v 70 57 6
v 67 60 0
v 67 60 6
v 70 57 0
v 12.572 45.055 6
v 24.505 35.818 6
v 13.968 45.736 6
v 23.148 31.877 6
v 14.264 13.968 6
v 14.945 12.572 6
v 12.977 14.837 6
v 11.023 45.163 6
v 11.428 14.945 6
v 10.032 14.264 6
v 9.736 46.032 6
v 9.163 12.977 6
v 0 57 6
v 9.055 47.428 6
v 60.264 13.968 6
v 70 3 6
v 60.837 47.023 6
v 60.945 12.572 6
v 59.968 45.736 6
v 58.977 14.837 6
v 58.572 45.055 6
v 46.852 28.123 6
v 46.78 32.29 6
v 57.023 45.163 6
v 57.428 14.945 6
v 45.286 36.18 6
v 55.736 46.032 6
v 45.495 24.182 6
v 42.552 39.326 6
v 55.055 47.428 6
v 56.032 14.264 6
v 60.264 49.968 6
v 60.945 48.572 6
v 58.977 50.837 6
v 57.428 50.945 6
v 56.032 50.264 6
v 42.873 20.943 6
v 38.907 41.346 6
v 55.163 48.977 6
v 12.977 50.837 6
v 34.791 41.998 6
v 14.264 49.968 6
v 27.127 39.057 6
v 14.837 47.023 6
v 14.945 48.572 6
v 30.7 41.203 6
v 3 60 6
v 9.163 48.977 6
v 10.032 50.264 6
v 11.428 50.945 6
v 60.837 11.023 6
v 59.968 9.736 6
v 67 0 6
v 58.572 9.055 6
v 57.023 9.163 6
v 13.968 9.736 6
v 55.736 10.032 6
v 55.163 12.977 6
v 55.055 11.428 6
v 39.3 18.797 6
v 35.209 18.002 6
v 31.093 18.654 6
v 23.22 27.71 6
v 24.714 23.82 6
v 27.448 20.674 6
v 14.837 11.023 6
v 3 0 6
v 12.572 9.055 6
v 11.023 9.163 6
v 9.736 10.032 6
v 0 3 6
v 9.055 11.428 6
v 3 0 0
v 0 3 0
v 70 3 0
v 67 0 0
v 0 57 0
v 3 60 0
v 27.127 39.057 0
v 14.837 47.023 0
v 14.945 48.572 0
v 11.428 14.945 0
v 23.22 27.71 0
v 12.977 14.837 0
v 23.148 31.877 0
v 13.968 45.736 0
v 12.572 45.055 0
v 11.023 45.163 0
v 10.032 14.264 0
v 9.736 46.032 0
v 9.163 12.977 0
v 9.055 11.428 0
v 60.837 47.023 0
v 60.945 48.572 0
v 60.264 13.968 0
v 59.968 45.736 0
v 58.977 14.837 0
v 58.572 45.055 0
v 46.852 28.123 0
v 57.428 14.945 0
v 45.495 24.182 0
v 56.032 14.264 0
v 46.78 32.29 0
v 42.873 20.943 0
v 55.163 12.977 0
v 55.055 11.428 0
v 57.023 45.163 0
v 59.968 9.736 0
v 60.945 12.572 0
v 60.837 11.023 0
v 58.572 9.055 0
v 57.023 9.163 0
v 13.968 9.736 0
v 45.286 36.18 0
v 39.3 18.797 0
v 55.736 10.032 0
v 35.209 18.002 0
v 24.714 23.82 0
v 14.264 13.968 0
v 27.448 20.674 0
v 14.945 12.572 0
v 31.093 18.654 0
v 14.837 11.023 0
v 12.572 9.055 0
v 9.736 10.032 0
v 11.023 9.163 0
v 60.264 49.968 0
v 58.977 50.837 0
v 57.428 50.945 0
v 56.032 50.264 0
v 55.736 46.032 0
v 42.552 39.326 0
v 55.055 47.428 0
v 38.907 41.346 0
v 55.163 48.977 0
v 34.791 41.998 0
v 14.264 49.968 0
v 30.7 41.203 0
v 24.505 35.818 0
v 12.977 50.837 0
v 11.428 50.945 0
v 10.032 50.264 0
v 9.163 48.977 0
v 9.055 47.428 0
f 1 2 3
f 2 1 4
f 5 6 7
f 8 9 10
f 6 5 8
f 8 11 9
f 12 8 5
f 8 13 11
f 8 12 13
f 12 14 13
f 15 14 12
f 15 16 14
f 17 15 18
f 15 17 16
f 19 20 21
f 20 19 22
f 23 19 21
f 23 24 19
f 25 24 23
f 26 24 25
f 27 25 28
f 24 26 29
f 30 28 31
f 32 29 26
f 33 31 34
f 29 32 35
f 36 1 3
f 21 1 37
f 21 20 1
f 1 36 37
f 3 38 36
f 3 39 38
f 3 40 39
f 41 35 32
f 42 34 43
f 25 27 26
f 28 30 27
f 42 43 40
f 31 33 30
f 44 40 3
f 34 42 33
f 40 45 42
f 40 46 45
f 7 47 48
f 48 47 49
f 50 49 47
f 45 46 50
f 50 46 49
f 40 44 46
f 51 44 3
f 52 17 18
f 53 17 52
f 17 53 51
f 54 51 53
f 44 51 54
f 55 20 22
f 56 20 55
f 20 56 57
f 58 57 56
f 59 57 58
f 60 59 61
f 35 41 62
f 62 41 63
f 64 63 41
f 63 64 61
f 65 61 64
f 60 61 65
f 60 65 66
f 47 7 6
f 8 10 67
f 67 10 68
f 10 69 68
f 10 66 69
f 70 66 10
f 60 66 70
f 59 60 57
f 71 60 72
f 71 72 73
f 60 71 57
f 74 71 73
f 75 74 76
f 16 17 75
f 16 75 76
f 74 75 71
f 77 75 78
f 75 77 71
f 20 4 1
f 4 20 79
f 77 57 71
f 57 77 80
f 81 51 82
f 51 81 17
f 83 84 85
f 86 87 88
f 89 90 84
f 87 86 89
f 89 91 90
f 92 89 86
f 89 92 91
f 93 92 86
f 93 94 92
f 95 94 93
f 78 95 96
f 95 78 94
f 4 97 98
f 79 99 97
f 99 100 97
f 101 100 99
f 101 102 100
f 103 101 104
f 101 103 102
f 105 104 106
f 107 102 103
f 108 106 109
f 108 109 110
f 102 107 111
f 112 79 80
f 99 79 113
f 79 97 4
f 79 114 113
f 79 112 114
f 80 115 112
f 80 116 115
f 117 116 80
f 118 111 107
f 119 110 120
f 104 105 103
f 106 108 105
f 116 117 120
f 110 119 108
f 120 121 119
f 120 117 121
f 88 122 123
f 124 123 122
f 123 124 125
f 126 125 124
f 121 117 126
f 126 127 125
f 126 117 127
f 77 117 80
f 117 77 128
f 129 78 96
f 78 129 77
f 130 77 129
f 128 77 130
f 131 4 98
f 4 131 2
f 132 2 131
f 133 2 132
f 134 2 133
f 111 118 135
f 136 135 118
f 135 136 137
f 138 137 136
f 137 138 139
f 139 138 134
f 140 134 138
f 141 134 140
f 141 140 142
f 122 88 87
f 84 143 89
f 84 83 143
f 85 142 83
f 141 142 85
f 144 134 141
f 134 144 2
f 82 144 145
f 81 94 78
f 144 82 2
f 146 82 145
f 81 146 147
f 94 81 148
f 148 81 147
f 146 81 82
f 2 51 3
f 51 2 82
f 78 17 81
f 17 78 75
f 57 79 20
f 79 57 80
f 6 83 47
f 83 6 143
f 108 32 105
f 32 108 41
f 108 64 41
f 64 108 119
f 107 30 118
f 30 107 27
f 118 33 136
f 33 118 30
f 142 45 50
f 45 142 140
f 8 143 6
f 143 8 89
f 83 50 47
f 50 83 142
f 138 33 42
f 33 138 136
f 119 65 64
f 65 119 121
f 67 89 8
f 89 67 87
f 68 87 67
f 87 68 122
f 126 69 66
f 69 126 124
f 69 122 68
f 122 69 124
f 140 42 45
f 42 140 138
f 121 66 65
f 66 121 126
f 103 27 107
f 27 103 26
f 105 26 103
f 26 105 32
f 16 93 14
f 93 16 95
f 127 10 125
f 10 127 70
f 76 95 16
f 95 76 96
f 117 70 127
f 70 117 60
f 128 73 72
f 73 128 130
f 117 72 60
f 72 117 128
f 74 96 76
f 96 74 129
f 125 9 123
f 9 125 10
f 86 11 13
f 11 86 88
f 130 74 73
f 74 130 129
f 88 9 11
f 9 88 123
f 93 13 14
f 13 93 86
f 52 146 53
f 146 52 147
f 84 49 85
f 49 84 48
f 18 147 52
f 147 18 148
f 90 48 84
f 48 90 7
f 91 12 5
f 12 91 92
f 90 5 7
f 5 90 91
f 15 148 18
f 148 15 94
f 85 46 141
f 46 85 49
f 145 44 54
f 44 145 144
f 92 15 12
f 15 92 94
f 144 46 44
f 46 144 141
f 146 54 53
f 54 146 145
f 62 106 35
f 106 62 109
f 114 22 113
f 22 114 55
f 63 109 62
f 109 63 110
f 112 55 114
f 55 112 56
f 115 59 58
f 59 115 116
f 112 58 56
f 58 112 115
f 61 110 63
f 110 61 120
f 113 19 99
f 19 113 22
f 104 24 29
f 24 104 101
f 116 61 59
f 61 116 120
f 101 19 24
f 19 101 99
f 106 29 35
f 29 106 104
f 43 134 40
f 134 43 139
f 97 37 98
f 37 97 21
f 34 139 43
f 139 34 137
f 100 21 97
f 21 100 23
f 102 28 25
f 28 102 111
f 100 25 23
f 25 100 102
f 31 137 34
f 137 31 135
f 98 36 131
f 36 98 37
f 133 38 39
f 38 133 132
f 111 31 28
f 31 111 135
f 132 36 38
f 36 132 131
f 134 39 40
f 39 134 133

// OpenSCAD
$fn = 32;

// ----------------------------------------------------------------------
// Spacer plate: rect 70 x 60
// ----------------------------------------------------------------------

// --- parameters (mm) ---
bore_r = 12;              // centre bore radius
bolt_r = 3;               // bolt hole radius
plate_t = 6;              // plate thickness, Z (extrusion height)
plate_l = 70;             // plate length, X
plate_w = 60;             // plate width, Y
inset = 12;               // corner hole inset

profile = [[3, 0], [67, 0], [70, 3], [70, 57], [67, 60], [3, 60], [0, 57], [0, 3]];  // primary outline, 8 points, counter clockwise
void_1 = [[46.78, 32.29], [45.286, 36.18], [42.552, 39.326], [38.907, 41.346], [34.791, 41.998], [30.7, 41.203], [27.127, 39.057], [24.505, 35.818], [23.148, 31.877], [23.22, 27.71], [24.714, 23.82], [27.448, 20.674], [31.093, 18.654], [35.209, 18.002], [39.3, 18.797], [42.873, 20.943], [45.495, 24.182], [46.852, 28.123]];  // centre bore, 18 points
void_2 = [[14.945, 12.572], [14.264, 13.968], [12.977, 14.837], [11.428, 14.945], [10.032, 14.264], [9.163, 12.977], [9.055, 11.428], [9.736, 10.032], [11.023, 9.163], [12.572, 9.055], [13.968, 9.736], [14.837, 11.023]];  // corner hole, 12 points
void_3 = [[14.945, 48.572], [14.264, 49.968], [12.977, 50.837], [11.428, 50.945], [10.032, 50.264], [9.163, 48.977], [9.055, 47.428], [9.736, 46.032], [11.023, 45.163], [12.572, 45.055], [13.968, 45.736], [14.837, 47.023]];  // corner hole, 12 points
void_4 = [[60.945, 12.572], [60.264, 13.968], [58.977, 14.837], [57.428, 14.945], [56.032, 14.264], [55.163, 12.977], [55.055, 11.428], [55.736, 10.032], [57.023, 9.163], [58.572, 9.055], [59.968, 9.736], [60.837, 11.023]];  // corner hole, 12 points
void_5 = [[60.945, 48.572], [60.264, 49.968], [58.977, 50.837], [57.428, 50.945], [56.032, 50.264], [55.163, 48.977], [55.055, 47.428], [55.736, 46.032], [57.023, 45.163], [58.572, 45.055], [59.968, 45.736], [60.837, 47.023]];  // corner hole, 12 points

// --- the one profile operation ---
difference() {
  linear_extrude(height = plate_t) polygon(points = profile);
  translate([0, 0, -1])
    linear_extrude(height = plate_t + 2) polygon(points = void_1);
  translate([0, 0, -1])
    linear_extrude(height = plate_t + 2) polygon(points = void_2);
  translate([0, 0, -1])
    linear_extrude(height = plate_t + 2) polygon(points = void_3);
  translate([0, 0, -1])
    linear_extrude(height = plate_t + 2) polygon(points = void_4);
  translate([0, 0, -1])
    linear_extrude(height = plate_t + 2) polygon(points = void_5);
}
